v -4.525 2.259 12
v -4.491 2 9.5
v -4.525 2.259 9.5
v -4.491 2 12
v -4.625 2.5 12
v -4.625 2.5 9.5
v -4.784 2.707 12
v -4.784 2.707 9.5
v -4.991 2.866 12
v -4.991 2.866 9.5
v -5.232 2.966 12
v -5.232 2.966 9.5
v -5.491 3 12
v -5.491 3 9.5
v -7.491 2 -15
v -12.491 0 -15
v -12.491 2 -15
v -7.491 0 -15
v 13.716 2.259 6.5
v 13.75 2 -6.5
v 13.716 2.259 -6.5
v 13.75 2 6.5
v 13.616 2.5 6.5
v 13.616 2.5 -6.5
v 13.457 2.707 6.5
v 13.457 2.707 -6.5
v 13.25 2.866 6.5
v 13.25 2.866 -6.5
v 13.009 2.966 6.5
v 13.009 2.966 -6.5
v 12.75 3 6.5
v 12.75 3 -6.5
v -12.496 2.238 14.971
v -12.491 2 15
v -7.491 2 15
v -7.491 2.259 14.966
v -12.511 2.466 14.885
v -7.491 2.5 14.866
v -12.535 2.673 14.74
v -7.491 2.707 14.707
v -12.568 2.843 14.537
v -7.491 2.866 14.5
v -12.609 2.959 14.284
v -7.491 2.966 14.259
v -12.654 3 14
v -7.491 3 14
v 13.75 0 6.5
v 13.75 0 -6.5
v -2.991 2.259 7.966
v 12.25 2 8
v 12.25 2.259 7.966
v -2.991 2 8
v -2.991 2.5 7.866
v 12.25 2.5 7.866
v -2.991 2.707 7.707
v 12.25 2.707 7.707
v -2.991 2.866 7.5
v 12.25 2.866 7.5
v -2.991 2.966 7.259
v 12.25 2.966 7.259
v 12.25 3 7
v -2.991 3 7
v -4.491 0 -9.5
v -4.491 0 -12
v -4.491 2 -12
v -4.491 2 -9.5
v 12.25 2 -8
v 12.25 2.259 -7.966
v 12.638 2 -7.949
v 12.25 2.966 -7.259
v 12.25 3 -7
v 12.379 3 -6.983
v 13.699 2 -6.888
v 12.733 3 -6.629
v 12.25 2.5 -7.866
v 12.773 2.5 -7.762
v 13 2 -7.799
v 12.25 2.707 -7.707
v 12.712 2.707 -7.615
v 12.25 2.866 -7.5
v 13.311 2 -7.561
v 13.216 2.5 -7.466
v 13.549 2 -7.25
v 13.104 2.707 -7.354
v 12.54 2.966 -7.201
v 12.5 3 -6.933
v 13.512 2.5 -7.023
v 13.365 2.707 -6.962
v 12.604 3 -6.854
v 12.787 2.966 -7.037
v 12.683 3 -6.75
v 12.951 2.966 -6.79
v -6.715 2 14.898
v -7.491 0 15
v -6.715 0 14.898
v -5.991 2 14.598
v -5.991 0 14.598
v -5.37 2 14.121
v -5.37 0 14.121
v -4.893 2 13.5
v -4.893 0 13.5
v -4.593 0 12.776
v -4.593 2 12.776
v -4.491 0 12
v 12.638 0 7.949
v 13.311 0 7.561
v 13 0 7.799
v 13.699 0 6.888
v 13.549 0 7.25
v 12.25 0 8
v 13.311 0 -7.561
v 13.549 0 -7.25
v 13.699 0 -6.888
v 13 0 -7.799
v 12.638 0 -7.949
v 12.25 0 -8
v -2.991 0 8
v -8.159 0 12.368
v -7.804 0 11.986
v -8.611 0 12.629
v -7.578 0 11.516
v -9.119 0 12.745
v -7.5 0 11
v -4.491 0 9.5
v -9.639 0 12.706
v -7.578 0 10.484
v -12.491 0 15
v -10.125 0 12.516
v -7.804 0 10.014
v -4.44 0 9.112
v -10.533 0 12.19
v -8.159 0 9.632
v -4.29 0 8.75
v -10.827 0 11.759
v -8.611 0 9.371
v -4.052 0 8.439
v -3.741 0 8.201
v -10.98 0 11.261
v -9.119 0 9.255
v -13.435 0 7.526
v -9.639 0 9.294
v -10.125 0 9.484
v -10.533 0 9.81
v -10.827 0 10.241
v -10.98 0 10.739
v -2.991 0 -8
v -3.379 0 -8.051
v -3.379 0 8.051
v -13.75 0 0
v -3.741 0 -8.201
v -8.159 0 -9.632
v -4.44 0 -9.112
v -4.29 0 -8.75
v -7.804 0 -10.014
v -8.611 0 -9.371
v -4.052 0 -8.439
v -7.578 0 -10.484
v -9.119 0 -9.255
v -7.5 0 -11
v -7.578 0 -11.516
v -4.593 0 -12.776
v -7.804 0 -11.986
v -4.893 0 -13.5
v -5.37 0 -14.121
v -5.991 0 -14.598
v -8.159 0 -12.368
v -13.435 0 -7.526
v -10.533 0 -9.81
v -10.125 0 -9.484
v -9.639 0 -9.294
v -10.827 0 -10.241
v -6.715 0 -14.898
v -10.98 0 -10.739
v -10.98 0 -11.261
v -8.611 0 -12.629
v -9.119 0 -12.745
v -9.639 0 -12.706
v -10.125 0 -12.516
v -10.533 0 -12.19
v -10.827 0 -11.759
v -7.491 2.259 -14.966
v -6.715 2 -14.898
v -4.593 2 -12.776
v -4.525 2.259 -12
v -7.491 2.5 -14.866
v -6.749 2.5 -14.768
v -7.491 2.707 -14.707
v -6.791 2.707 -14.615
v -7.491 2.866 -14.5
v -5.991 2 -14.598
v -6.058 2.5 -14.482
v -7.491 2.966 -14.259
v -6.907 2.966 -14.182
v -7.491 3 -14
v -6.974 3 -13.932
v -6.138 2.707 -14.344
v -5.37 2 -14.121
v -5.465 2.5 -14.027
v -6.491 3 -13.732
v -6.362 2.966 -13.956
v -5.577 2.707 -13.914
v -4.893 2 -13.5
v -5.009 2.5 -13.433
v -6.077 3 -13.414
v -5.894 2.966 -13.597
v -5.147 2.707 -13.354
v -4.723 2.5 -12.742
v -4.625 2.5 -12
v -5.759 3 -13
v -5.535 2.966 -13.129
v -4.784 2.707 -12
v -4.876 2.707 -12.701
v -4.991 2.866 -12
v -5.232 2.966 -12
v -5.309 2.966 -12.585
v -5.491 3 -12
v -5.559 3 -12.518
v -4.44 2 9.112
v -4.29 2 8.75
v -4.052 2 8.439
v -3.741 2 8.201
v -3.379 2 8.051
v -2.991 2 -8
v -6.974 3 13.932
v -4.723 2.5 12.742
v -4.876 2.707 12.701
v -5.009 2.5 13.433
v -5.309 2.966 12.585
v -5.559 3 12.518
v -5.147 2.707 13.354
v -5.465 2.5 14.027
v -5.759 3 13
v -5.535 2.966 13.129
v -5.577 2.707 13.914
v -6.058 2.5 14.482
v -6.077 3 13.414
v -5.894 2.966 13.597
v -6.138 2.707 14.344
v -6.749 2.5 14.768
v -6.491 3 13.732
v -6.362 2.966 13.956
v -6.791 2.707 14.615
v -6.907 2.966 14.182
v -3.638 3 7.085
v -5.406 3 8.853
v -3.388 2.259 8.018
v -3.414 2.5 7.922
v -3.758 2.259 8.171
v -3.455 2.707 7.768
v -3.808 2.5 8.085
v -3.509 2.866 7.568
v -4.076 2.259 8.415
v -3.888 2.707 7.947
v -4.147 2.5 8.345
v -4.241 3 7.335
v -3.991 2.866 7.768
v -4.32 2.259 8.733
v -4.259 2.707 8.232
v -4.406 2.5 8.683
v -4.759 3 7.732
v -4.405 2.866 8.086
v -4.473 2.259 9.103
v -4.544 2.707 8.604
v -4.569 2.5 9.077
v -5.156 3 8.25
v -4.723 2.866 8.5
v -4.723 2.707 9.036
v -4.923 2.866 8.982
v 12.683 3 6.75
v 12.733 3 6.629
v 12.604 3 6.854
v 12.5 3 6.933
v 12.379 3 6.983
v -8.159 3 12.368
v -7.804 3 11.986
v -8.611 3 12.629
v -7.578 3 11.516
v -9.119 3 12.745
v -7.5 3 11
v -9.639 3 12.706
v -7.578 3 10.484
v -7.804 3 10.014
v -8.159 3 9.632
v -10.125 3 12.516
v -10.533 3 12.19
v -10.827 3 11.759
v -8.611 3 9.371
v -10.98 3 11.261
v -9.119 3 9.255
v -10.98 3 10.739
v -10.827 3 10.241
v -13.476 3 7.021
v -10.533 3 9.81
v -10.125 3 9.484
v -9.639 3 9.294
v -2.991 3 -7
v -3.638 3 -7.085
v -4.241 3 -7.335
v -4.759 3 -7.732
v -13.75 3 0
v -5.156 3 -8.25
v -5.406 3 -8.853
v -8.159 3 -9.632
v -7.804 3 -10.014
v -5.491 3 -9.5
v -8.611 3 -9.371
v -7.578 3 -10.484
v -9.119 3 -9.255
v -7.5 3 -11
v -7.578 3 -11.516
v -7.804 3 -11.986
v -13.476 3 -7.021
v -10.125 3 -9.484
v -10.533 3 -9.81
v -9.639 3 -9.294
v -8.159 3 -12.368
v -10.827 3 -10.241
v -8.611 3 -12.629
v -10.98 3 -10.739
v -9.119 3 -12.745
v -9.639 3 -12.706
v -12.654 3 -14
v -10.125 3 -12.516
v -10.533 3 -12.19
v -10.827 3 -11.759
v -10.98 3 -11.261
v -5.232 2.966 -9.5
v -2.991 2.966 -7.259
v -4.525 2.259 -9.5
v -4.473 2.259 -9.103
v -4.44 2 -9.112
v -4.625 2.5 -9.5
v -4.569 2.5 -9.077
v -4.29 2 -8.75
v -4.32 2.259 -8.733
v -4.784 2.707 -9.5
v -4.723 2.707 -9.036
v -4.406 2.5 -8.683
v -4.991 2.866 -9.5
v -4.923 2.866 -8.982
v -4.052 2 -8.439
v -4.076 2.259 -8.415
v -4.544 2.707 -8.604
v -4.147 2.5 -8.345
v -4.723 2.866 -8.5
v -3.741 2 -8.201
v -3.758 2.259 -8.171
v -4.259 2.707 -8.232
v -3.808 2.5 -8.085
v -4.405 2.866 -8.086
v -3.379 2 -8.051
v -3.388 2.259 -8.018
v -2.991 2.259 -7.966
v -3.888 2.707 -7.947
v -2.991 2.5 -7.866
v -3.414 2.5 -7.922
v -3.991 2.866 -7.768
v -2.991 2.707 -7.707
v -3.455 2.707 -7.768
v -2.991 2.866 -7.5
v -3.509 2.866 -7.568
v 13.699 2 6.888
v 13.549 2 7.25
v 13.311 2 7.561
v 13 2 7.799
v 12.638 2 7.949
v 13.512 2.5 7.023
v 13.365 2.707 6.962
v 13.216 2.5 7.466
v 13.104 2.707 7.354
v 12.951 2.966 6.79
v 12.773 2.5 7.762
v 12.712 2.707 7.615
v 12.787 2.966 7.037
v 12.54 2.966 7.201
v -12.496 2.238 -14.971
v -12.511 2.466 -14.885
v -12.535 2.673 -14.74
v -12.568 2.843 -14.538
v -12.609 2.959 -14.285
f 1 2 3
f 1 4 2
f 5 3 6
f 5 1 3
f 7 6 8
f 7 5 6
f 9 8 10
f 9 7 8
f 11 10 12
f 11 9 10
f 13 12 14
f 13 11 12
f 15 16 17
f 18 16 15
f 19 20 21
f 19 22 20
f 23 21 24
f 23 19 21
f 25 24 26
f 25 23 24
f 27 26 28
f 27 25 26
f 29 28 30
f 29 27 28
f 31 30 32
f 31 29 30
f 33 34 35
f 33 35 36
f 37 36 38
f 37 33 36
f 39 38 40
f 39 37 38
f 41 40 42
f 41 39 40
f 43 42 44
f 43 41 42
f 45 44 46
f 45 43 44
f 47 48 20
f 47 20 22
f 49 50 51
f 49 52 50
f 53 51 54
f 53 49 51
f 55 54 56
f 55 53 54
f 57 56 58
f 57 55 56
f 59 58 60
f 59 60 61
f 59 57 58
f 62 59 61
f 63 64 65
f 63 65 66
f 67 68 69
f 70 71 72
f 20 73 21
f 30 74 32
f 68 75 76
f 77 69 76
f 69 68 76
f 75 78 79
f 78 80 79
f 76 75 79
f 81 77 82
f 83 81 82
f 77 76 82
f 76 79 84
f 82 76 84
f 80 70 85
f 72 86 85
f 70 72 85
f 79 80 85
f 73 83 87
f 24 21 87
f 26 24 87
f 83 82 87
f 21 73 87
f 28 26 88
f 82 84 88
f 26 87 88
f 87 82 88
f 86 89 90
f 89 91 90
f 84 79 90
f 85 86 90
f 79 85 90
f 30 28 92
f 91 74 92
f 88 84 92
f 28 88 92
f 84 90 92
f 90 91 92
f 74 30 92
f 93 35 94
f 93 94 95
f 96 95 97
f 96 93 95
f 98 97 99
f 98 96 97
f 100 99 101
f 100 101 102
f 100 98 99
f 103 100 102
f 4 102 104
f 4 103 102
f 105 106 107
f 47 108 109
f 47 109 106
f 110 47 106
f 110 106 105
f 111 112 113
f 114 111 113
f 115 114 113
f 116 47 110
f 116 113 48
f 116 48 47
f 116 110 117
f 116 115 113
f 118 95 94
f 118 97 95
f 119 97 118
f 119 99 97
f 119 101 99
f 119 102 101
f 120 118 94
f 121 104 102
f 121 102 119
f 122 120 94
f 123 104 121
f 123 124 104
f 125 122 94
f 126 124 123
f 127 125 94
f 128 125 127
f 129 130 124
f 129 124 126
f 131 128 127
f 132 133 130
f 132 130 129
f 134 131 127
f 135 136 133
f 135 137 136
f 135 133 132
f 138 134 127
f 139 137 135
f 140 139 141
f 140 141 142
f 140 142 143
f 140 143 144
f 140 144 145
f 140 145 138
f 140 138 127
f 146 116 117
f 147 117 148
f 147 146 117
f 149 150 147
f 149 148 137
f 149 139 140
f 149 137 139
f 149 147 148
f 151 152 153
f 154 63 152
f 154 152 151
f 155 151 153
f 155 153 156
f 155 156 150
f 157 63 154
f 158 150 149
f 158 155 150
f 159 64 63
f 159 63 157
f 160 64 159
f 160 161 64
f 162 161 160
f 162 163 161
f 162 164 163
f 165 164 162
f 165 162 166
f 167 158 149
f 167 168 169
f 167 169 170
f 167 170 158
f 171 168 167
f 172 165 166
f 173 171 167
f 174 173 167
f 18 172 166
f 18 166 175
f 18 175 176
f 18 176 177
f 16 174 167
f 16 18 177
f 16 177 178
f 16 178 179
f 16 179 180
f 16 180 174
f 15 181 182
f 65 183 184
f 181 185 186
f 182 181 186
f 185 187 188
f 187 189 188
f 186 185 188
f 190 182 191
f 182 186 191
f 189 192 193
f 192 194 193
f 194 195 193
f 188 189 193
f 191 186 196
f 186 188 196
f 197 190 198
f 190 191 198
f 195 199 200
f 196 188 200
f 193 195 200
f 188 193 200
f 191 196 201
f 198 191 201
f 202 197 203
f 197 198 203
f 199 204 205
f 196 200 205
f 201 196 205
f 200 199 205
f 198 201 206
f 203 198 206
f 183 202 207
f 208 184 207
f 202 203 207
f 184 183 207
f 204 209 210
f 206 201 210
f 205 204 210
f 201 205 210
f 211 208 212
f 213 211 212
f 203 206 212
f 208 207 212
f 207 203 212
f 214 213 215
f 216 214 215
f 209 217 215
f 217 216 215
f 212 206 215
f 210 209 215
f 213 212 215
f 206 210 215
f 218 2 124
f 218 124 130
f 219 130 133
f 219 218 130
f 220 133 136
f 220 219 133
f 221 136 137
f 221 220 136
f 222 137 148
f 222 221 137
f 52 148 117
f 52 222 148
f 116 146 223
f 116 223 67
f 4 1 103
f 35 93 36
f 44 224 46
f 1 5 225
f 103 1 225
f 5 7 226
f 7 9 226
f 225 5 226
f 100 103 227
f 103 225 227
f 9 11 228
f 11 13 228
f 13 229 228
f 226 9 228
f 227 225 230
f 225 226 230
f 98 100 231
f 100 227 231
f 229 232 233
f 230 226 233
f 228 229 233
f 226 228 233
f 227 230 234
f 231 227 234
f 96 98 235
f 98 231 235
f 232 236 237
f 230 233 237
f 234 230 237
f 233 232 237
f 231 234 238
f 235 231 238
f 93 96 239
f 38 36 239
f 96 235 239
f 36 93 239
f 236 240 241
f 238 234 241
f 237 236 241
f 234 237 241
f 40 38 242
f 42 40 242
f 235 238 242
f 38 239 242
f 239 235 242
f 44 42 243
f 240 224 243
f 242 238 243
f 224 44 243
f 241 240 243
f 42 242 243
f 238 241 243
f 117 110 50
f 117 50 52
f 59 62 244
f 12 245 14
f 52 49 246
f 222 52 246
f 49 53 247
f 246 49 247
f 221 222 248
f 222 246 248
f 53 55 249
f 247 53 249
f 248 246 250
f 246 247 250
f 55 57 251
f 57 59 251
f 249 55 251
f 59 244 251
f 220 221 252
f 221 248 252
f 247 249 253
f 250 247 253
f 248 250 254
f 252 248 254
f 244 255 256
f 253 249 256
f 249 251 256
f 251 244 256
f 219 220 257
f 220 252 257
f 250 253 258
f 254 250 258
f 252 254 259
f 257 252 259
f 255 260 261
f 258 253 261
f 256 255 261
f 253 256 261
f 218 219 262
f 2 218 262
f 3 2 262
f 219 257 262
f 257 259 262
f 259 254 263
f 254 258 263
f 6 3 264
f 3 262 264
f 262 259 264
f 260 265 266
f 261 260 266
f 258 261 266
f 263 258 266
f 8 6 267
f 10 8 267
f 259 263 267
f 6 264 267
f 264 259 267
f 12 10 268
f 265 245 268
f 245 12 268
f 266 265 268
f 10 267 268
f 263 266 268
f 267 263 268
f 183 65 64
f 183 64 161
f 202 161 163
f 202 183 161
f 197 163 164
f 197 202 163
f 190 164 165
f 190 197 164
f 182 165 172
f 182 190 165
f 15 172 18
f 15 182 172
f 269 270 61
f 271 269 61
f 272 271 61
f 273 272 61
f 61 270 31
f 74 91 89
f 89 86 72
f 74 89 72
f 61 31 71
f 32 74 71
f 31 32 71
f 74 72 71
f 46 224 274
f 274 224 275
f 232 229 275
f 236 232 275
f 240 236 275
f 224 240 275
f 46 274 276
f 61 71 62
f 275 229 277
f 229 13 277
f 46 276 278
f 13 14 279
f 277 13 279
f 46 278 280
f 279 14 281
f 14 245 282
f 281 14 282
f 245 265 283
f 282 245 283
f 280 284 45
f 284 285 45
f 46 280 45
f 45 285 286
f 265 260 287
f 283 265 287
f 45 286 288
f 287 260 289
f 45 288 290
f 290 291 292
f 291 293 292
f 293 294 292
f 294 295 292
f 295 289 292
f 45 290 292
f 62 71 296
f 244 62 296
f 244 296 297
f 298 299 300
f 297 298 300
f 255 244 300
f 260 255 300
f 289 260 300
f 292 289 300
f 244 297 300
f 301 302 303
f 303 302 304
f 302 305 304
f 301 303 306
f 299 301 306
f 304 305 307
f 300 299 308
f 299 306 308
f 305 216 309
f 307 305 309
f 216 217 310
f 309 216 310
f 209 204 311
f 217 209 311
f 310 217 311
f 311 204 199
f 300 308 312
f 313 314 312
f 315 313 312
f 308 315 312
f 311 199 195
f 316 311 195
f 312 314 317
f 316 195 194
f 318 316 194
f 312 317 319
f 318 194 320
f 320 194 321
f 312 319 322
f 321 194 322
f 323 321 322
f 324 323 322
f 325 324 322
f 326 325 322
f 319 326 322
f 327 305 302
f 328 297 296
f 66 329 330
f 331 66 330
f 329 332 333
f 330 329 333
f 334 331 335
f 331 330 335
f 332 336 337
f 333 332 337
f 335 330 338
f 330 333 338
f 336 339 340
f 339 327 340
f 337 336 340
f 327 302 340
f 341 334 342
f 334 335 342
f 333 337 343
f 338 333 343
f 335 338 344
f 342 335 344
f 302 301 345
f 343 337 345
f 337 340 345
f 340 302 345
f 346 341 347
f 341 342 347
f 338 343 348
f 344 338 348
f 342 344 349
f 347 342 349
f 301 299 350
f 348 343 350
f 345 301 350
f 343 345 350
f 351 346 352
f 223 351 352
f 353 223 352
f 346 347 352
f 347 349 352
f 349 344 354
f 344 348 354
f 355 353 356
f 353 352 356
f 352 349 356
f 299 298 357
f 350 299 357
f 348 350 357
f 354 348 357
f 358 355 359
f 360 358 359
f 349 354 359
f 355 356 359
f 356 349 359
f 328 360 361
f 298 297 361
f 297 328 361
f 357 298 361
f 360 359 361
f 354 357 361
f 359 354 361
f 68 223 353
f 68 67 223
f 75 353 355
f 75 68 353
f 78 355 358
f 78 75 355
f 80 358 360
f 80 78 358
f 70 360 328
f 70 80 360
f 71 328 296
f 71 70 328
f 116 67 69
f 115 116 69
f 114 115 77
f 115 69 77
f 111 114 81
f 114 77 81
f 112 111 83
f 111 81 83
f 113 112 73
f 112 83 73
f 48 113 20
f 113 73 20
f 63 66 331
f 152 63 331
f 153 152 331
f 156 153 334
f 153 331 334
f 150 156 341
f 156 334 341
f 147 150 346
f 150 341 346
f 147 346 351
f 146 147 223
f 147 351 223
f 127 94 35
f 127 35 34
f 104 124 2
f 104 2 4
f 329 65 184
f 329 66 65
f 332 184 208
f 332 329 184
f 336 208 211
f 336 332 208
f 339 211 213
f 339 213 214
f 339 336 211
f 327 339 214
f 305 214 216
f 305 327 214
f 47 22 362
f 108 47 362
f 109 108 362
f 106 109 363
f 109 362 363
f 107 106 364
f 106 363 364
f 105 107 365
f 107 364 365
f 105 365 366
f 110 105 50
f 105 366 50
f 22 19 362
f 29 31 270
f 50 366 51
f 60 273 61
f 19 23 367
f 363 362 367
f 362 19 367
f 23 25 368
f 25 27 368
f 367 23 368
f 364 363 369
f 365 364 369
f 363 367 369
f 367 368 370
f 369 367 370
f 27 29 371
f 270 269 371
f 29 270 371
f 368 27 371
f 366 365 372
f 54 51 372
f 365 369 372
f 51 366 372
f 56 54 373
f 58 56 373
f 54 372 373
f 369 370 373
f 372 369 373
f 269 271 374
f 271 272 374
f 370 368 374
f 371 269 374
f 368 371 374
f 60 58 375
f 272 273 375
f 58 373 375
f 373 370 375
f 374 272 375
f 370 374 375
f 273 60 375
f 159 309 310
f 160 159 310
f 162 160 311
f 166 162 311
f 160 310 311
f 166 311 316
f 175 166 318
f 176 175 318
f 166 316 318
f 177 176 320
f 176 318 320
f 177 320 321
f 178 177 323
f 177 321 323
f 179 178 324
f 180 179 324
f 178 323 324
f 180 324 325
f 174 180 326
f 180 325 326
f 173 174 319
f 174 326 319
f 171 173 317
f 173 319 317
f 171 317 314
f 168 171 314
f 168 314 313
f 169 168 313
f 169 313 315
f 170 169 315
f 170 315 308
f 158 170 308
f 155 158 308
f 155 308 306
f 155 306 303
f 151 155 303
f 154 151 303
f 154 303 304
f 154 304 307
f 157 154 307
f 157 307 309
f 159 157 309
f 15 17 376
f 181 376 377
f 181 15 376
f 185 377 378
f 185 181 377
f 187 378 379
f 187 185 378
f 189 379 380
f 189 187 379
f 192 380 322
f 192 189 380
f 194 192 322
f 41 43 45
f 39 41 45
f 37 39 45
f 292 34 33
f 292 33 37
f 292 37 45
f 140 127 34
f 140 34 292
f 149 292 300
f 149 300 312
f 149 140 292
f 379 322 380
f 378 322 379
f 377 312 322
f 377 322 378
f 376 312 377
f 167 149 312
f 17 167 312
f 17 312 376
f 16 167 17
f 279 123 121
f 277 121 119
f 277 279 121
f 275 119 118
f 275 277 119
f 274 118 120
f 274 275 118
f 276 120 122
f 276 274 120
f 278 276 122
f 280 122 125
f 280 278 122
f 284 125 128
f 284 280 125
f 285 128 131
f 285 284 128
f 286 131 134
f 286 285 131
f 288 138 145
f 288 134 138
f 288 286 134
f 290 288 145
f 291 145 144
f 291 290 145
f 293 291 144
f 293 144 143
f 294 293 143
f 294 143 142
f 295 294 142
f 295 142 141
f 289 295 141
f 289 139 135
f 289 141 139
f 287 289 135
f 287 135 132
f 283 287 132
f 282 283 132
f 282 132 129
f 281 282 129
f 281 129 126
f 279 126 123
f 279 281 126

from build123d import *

# Parameters (mm, degrees)
BOSS_EXTRUDE1_DEPTH = 3
SKETCH2_R           = 1.75
CUT_EXTRUDE1_DEPTH  = 4
FILLET1_R           = 1.5
FILLET3_R           = 3
FILLET2_R           = 1


with BuildPart() as part:
    # Sketch1 → Boss-Extrude1 (new body)
    with BuildSketch(Plane(origin=(0, 0, 0), x_dir=(1, 0, 0), z_dir=(0, 1, 0))):
        with BuildLine():
            Line((-12.491196746, 15), (-4.491196746, 15))
            Line((-4.491196746, 15), (-4.491196746, 8))
            Line((-4.491196746, 8), (13.75, 8))
            Line((13.75, 8), (13.75, -8))
            Line((13.75, -8), (-4.491196746, -8))
            Line((-4.491196746, -8), (-4.491196746, -15))
            Line((-4.491196746, -15), (-12.491196746, -15))
            ThreePointArc((-12.491196746, -15), (-13.75, 0), (-12.491196746, 15))
        make_face()
    extrude(amount=BOSS_EXTRUDE1_DEPTH)

    # Sketch2 → Cut-Extrude1 (cut, through all)
    with BuildSketch(Plane(origin=(0, 3, 0), x_dir=(1, 0, 0), z_dir=(0, 1, 0))):
        with Locations((-9.25, 11)):
            Circle(SKETCH2_R)
    cut_extrude1 = extrude(amount=-CUT_EXTRUDE1_DEPTH, mode=Mode.SUBTRACT)

    # Mirror1: Cut-Extrude1 across plane
    add(cut_extrude1.mirror(Plane.XY), mode=Mode.SUBTRACT)

    # Fillet1
    fillet1_edges = [part.edges().sort_by_distance(p)[0] for p in [
        (-4.491196746, 1.5, -8),
        (13.75, 1.5, -8),
        (13.75, 1.5, 8),
        (-4.491196746, 1.5, 8),
    ]]
    fillet(fillet1_edges, radius=FILLET1_R)

    # Fillet3
    fillet3_edges = [part.edges().sort_by_distance(p)[0] for p in [
        (-4.491196746, 1.5, -15),
        (-4.491196746, 1.5, 15),
    ]]
    fillet(fillet3_edges, radius=FILLET3_R)

    # Fillet2
    fillet2_edges = [part.edges().sort_by_distance(p)[0] for p in [
        (-4.491196746, 3, -10.75),
        (4.629401627, 3, -8),
        (4.629401627, 3, 8),
        (13.75, 3, 0),
        (13.310660172, 3, 7.560660172),
        (13.310660172, 3, -7.560660172),
        (-4.051856918, 3, -8.439339828),
        (-4.051856918, 3, 8.439339828),
        (-9.991196746, 3, -15),
        (-4.491196746, 3, 10.75),
        (-5.369876403, 3, 14.121320344),
        (-5.369876403, 3, -14.121320344),
        (-9.991196746, 3, 15),
    ]]
    fillet(fillet2_edges, radius=FILLET2_R)


solid = part.part
